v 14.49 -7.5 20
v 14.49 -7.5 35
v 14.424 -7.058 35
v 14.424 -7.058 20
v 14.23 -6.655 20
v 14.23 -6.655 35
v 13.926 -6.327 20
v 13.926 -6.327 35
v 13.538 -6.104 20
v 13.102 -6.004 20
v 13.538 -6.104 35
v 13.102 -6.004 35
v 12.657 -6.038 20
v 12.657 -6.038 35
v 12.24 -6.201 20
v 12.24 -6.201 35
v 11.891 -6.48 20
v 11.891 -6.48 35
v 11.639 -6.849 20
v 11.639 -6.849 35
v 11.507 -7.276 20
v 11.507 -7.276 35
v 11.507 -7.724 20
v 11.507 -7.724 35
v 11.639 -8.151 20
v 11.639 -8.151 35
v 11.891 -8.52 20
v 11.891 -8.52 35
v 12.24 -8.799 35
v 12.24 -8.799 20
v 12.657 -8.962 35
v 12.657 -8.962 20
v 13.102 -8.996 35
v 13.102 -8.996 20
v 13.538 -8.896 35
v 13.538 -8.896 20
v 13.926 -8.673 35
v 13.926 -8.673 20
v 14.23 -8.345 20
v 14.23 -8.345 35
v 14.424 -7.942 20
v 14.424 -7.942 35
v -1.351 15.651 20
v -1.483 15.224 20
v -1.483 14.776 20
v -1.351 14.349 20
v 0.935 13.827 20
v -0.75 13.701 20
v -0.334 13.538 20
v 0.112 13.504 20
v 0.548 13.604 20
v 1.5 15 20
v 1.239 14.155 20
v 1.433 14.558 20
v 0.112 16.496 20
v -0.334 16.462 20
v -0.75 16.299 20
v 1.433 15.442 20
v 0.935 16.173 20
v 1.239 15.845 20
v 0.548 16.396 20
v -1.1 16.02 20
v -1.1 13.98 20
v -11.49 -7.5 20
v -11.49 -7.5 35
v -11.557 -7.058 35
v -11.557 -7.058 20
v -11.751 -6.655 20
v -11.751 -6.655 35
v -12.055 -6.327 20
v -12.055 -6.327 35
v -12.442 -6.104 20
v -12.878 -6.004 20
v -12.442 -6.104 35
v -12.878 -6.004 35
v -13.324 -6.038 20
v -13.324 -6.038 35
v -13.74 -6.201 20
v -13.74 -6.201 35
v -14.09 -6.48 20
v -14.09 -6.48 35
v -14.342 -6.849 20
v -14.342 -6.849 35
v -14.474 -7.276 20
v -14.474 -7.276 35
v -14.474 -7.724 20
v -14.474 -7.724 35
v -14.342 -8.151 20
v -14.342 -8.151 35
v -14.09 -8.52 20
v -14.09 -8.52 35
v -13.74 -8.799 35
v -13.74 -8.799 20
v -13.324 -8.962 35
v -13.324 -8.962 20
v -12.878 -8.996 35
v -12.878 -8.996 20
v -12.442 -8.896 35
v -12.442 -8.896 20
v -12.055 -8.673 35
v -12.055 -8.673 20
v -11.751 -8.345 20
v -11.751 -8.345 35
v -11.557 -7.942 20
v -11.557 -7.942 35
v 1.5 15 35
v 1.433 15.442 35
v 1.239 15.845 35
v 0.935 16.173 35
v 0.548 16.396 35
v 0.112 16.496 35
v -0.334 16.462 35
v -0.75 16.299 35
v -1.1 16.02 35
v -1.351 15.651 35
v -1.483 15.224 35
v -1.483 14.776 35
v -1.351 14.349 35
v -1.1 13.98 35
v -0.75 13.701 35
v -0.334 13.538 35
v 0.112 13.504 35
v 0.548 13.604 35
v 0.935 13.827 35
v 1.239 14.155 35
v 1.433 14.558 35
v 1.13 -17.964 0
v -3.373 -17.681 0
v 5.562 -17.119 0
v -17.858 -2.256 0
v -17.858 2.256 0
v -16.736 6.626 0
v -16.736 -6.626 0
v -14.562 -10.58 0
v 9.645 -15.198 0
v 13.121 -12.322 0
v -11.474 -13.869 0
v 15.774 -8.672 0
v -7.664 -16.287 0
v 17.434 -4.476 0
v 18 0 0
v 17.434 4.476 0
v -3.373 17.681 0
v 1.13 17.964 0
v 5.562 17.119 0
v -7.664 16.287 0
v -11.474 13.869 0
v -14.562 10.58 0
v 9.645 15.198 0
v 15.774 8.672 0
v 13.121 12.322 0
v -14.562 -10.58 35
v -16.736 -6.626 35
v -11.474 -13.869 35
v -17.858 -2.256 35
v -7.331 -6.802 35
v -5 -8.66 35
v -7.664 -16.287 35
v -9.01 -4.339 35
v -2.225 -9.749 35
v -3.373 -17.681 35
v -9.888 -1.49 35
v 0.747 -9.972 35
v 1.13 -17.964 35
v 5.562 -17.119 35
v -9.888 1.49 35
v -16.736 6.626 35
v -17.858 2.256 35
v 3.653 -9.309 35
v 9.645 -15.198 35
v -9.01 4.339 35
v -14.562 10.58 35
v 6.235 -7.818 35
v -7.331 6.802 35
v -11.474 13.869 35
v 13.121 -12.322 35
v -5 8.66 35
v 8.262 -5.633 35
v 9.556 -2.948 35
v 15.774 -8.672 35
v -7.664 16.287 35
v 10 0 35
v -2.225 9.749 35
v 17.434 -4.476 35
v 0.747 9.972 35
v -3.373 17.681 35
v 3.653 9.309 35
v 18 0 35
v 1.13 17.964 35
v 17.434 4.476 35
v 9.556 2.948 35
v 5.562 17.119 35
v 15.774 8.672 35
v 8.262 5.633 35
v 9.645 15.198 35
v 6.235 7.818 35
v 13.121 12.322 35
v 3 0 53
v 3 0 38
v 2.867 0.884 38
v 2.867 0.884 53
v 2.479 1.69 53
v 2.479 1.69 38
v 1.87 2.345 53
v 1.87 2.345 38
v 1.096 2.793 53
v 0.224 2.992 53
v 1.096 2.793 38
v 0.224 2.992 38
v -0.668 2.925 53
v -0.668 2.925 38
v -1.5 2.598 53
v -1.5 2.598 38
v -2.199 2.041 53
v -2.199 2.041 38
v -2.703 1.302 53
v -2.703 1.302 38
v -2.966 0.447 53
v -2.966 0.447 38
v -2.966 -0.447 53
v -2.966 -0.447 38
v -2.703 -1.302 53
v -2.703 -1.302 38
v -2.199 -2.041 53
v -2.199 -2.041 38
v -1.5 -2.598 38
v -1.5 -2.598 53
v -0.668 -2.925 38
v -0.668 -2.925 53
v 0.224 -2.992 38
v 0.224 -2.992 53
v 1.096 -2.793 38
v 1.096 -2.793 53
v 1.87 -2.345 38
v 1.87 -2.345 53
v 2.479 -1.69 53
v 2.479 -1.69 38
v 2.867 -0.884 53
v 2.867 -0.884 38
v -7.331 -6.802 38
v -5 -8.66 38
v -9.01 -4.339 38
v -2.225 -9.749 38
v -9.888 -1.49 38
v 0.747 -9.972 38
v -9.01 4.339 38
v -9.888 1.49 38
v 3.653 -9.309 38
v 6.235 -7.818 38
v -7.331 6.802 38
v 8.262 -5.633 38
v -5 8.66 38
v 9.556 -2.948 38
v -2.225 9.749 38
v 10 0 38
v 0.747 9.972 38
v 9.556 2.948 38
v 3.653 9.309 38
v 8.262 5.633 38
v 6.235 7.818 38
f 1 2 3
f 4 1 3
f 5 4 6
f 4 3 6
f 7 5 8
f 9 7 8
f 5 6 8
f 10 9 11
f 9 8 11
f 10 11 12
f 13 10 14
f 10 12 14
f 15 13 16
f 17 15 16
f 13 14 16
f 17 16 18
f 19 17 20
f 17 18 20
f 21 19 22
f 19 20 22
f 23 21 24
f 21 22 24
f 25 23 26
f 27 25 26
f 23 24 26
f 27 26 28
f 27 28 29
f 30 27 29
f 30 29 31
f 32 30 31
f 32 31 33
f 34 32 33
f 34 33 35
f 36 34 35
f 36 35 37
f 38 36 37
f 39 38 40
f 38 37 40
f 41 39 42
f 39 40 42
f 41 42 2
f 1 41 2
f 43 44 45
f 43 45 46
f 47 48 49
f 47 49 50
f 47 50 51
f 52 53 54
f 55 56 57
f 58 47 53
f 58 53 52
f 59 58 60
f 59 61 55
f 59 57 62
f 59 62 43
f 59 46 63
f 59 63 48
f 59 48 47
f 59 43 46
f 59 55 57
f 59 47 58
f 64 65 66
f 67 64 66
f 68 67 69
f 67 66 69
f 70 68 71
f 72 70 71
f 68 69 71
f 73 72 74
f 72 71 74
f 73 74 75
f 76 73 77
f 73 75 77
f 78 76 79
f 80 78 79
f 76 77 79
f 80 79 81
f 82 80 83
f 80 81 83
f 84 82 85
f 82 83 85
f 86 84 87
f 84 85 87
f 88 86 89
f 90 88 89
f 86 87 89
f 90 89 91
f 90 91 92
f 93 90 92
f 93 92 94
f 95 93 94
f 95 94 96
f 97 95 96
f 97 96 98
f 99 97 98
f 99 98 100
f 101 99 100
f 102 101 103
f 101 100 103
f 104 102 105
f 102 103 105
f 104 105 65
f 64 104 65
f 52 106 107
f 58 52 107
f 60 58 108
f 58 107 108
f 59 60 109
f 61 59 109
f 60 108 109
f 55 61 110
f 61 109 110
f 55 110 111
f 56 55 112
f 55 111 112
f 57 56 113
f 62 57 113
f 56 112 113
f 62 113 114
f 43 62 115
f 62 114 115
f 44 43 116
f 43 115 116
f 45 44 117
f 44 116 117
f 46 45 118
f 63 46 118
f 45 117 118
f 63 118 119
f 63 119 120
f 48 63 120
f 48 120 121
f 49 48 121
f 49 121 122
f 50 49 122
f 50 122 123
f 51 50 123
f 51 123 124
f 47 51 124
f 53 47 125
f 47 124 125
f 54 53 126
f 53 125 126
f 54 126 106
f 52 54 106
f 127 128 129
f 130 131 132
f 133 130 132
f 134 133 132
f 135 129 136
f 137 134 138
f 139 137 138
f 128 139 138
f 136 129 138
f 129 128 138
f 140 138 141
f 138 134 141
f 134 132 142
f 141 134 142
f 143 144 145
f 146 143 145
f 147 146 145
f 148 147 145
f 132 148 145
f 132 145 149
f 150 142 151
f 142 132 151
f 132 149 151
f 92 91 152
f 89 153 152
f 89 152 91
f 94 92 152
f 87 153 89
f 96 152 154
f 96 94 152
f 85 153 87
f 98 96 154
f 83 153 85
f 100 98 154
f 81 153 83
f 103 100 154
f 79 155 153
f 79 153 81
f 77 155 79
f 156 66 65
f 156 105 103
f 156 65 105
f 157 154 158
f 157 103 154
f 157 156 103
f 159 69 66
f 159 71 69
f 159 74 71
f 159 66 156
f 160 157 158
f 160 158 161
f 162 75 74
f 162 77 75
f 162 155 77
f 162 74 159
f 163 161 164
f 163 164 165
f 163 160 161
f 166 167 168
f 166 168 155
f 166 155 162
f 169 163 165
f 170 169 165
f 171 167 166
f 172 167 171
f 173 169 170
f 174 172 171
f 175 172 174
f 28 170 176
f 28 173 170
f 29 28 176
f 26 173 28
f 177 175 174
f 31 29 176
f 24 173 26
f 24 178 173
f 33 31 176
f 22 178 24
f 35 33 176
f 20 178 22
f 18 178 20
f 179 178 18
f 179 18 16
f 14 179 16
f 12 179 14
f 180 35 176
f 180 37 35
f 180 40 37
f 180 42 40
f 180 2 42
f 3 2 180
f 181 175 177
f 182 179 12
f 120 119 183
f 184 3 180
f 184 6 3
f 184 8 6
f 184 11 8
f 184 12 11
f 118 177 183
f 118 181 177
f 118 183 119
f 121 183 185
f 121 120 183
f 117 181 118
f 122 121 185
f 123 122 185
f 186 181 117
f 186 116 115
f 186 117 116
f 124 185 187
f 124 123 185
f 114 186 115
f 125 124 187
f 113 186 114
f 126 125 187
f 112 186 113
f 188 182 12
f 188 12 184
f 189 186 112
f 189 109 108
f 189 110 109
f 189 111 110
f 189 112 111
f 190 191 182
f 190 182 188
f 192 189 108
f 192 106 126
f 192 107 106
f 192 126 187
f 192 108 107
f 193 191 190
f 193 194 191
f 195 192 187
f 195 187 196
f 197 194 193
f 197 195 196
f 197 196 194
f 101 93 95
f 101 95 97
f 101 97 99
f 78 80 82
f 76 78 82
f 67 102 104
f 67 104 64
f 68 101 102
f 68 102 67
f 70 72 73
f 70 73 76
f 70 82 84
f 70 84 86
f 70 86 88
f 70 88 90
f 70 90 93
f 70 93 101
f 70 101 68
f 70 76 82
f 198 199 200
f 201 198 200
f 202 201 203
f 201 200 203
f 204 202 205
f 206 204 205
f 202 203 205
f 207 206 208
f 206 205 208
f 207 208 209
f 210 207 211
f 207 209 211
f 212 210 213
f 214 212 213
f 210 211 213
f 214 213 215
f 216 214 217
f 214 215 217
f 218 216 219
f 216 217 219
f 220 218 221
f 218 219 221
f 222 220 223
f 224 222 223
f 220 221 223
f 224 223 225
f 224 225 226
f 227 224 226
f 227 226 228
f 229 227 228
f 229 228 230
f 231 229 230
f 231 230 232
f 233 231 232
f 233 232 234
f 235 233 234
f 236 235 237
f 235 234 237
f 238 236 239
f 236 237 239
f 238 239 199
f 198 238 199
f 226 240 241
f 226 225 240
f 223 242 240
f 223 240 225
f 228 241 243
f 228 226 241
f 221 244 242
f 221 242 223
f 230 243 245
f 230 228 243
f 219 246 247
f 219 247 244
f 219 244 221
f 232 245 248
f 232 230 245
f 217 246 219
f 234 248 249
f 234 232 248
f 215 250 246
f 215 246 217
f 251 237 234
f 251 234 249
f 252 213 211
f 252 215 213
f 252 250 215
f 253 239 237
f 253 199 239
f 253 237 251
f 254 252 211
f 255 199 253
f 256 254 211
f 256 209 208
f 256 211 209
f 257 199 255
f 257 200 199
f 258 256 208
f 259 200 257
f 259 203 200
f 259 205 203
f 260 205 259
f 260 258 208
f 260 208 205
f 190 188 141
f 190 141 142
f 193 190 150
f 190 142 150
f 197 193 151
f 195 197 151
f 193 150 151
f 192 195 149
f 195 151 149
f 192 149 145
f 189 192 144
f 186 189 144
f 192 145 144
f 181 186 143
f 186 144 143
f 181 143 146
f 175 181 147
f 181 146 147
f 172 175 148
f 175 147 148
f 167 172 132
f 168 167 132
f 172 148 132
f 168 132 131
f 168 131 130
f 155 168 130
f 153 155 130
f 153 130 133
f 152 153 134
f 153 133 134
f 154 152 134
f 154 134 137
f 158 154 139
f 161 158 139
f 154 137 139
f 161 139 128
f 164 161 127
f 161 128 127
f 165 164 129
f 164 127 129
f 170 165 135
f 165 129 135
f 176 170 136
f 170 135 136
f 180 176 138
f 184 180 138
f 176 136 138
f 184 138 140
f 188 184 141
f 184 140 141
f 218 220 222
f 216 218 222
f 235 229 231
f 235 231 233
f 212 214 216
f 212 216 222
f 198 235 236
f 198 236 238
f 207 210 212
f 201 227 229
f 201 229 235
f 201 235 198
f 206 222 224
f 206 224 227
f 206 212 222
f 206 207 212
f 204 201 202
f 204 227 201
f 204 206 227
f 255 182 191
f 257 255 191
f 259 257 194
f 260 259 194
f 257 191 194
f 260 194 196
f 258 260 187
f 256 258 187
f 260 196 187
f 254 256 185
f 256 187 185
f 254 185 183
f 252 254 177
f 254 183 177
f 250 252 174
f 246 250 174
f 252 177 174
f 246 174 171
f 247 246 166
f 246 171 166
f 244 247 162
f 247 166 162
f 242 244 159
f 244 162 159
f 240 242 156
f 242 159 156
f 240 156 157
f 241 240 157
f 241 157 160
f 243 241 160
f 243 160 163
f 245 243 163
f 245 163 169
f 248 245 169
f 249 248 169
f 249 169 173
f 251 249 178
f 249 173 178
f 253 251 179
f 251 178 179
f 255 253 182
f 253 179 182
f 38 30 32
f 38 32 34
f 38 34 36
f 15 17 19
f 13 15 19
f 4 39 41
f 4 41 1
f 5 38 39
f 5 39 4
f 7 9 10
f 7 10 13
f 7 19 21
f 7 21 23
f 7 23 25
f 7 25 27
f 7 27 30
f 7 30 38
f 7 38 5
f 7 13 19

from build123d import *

# Parameters (mm, degrees)
SKETCH1_R           = 18
BOSS_EXTRUDE1_DEPTH = 35
SKETCH2_R           = 10
BOSS_EXTRUDE2_DEPTH = 3
SKETCH3_R           = 3
BOSS_EXTRUDE3_DEPTH = 15
SKETCH4_R           = 1.5
CUT_EXTRUDE1_DEPTH  = 15


with BuildPart() as part:
    # Sketch1 → Boss-Extrude1 (new body)
    with BuildSketch(Plane.XY):
        Circle(SKETCH1_R)
    extrude(amount=BOSS_EXTRUDE1_DEPTH)

    # Sketch2 → Boss-Extrude2 (add)
    with BuildSketch(Plane.XY.offset(35)):
        Circle(SKETCH2_R)
    extrude(amount=BOSS_EXTRUDE2_DEPTH)

    # Sketch3 → Boss-Extrude3 (add)
    with BuildSketch(Plane.XY.offset(38)):
        Circle(SKETCH3_R)
    extrude(amount=BOSS_EXTRUDE3_DEPTH)

    # Sketch4 → Cut-Extrude1 (cut)
    with BuildSketch(Plane.XY.offset(35)):
        with Locations((0, 15)):
            Circle(SKETCH4_R)
        with Locations((12.990381057, -7.5)):
            Circle(SKETCH4_R)
        with Locations((-12.990381057, -7.5)):
            Circle(SKETCH4_R)
    extrude(amount=-CUT_EXTRUDE1_DEPTH, mode=Mode.SUBTRACT)


solid = part.part
